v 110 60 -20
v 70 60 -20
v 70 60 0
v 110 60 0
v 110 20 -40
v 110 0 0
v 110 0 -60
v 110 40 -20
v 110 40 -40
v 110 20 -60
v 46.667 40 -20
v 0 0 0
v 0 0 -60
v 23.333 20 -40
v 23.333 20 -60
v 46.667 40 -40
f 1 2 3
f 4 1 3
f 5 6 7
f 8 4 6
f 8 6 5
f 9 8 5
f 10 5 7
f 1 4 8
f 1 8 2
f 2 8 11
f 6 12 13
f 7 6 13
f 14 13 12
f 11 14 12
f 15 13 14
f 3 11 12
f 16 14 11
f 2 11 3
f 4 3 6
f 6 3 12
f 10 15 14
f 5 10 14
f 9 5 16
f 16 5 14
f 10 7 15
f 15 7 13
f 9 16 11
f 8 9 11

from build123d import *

# Parameters (mm, degrees)
SALIENTE_EXTRUIR1_DEPTH    = 110
CORTAR_EXTRUIR1_DEPTH      = 139.924439894
CORTAR_EXTRUIR1_DEPTH_BACK = 139.924439894


with BuildPart() as part:
    # Croquis2 → Saliente-Extruir1 (new body)
    with BuildSketch(Plane(origin=(0, 0, 0), x_dir=(0, 0, -1), z_dir=(1, 0, 0))):
        Polygon((0, 0), (60, 0), (60, 20), (40, 20), (40, 40), (20, 40), (20, 60), (0, 60), align=None)
    extrude(amount=SALIENTE_EXTRUIR1_DEPTH)

    # Croquis3 → Cortar-Extruir1 (cut, two sides: drawn at the far end of the back side and taken through both)
    with BuildSketch(Plane.XY.offset(-CORTAR_EXTRUIR1_DEPTH_BACK)):
        Polygon((-197.86172522, -169.595764474), (0, 0), (70, 60), (267.86172522, 229.595764474), (-71.329803728, 625.319214913), (-537.053254168, 226.127685965), align=None)
    extrude(amount=CORTAR_EXTRUIR1_DEPTH + CORTAR_EXTRUIR1_DEPTH_BACK, mode=Mode.SUBTRACT)


solid = part.part
